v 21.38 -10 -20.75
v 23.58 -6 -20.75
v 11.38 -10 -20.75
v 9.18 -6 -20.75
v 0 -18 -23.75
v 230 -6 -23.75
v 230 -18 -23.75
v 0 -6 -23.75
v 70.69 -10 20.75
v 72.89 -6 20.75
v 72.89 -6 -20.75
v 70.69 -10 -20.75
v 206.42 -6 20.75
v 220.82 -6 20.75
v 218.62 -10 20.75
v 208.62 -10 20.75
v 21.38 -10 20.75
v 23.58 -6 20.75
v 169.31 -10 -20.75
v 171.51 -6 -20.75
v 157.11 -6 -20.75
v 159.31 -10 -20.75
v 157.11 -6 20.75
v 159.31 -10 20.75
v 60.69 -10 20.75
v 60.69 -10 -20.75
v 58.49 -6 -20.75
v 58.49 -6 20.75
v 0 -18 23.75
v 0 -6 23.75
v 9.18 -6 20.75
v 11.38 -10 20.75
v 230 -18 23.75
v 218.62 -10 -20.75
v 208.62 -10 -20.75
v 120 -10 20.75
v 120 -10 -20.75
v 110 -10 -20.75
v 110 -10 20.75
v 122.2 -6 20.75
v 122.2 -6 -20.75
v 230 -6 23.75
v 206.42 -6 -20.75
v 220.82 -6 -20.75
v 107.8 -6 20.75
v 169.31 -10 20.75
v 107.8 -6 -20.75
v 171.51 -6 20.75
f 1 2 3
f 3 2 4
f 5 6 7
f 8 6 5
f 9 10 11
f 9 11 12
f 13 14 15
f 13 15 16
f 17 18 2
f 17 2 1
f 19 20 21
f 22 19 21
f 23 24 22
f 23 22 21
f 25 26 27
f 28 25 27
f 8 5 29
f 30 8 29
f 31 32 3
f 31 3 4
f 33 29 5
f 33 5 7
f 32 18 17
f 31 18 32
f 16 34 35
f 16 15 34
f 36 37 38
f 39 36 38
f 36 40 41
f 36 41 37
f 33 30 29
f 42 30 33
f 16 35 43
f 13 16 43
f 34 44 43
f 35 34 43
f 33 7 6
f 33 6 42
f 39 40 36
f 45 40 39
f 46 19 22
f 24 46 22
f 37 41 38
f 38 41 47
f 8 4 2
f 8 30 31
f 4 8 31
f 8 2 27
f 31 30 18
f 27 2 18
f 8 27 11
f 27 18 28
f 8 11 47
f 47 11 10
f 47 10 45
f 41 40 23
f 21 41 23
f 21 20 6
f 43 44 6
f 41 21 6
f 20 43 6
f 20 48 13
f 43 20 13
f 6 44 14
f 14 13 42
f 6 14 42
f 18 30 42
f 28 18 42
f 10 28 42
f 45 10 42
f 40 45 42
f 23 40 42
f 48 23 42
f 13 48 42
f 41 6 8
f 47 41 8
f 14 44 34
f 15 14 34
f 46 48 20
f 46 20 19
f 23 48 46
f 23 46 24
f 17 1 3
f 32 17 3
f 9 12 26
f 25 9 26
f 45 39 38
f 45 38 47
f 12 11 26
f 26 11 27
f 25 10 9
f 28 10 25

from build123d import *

# Parameters (mm, degrees)
EXTRUDE_1_DEPTH     = 19.2
SKETCH_9_W          = 230
SKETCH_9_H          = 17.5
SKETCH_9_R          = 2.1
EXTRUDE_2_DEPTH     = 3
SKETCH_13_W         = 230
SKETCH_13_H         = 16
SKETCH_13_R         = 2.1
EXTRUDE_3_DEPTH     = 1.55
SKETCH_14_W         = 230
SKETCH_14_H         = 47.5
SKETCH_14_R         = 2.1
EXTRUDE_4_DEPTH     = 3
SKETCH_15_W         = 208.313471068
SKETCH_15_H         = 9.29970853
EXTRUDE_5_DEPTH     = 47.5
SKETCH_16_W         = 230
SKETCH_16_H         = 33.21324475
EXTRUDE_6_DEPTH     = 3
SKETCH_18_W         = 230
SKETCH_18_H         = 20.5
EXTRUDE_7_DEPTH     = 44.5
SKETCH_19_W         = 230
SKETCH_19_H         = 8.5
CUT_EXTRUDE_1_DEPTH = 236.542459017
CUT_EXTRUDE_2_DEPTH = 20.75


with BuildPart() as part:
    # ｽｹｯﾁ5 → ﾎﾞｽ - 押し出し1 (new body)
    with BuildSketch(Plane.XY.offset(-1.55)):
        with BuildLine():
            Line((230, -2.976), (227.539284327, -2.976))
            ThreePointArc((227.539284327, -2.976), (226.75348461, -2.728238301), (226.251905437, -2.074567596))
            Line((226.251905437, -2.074567596), (225.496824583, 0))
            Line((225.496824583, 0), (219.003175417, 0))
            Line((219.003175417, 0), (218.248094563, -2.074567596))
            ThreePointArc((218.248094563, -2.074567596), (217.74651539, -2.728238301), (216.960715673, -2.976))
            Line((216.960715673, -2.976), (214.839284327, -2.976))
            ThreePointArc((214.839284327, -2.976), (214.05348461, -2.728238301), (213.551905437, -2.074567596))
            Line((213.551905437, -2.074567596), (212.796824583, 0))
            Line((212.796824583, 0), (206.303175417, 0))
            Line((206.303175417, 0), (205.548094563, -2.074567596))
            ThreePointArc((205.548094563, -2.074567596), (205.04651539, -2.728238301), (204.260715673, -2.976))
            Line((204.260715673, -2.976), (202.139284327, -2.976))
            ThreePointArc((202.139284327, -2.976), (201.35348461, -2.728238301), (200.851905437, -2.074567596))
            Line((200.851905437, -2.074567596), (200.096824583, 0))
            Line((200.096824583, 0), (193.603175417, 0))
            Line((193.603175417, 0), (192.848094563, -2.074567596))
            ThreePointArc((192.848094563, -2.074567596), (192.34651539, -2.728238301), (191.560715673, -2.976))
            Line((191.560715673, -2.976), (189.439284327, -2.976))
            ThreePointArc((189.439284327, -2.976), (188.65348461, -2.728238301), (188.151905437, -2.074567596))
            Line((188.151905437, -2.074567596), (187.396824583, 0))
            Line((187.396824583, 0), (180.903175417, 0))
            Line((180.903175417, 0), (180.148094563, -2.074567596))
            ThreePointArc((180.148094563, -2.074567596), (179.64651539, -2.728238301), (178.860715673, -2.976))
            Line((178.860715673, -2.976), (176.739284327, -2.976))
            ThreePointArc((176.739284327, -2.976), (175.95348461, -2.728238301), (175.451905437, -2.074567596))
            Line((175.451905437, -2.074567596), (174.696824583, 0))
            Line((174.696824583, 0), (168.203175417, 0))
            Line((168.203175417, 0), (167.448094563, -2.074567596))
            ThreePointArc((167.448094563, -2.074567596), (166.94651539, -2.728238301), (166.160715673, -2.976))
            Line((166.160715673, -2.976), (164.039284327, -2.976))
            ThreePointArc((164.039284327, -2.976), (163.25348461, -2.728238301), (162.751905437, -2.074567596))
            Line((162.751905437, -2.074567596), (161.996824583, 0))
            Line((161.996824583, 0), (155.503175417, 0))
            Line((155.503175417, 0), (154.748094563, -2.074567596))
            ThreePointArc((154.748094563, -2.074567596), (154.24651539, -2.728238301), (153.460715673, -2.976))
            Line((153.460715673, -2.976), (151.339284327, -2.976))
            ThreePointArc((151.339284327, -2.976), (150.55348461, -2.728238301), (150.051905437, -2.074567596))
            Line((150.051905437, -2.074567596), (149.296824583, 0))
            Line((149.296824583, 0), (142.803175417, 0))
            Line((142.803175417, 0), (142.048094563, -2.074567596))
            ThreePointArc((142.048094563, -2.074567596), (141.54651539, -2.728238301), (140.760715673, -2.976))
            Line((140.760715673, -2.976), (138.639284327, -2.976))
            ThreePointArc((138.639284327, -2.976), (137.85348461, -2.728238301), (137.351905437, -2.074567596))
            Line((137.351905437, -2.074567596), (136.596824583, 0))
            Line((136.596824583, 0), (130.103175417, 0))
            Line((130.103175417, 0), (129.348094563, -2.074567596))
            ThreePointArc((129.348094563, -2.074567596), (128.84651539, -2.728238301), (128.060715673, -2.976))
            Line((128.060715673, -2.976), (125.939284327, -2.976))
            ThreePointArc((125.939284327, -2.976), (125.15348461, -2.728238301), (124.651905437, -2.074567596))
            Line((124.651905437, -2.074567596), (123.896824583, 0))
            Line((123.896824583, 0), (117.403175417, 0))
            Line((117.403175417, 0), (116.648094563, -2.074567596))
            ThreePointArc((116.648094563, -2.074567596), (116.14651539, -2.728238301), (115.360715673, -2.976))
            Line((115.360715673, -2.976), (113.239284327, -2.976))
            ThreePointArc((113.239284327, -2.976), (112.45348461, -2.728238301), (111.951905437, -2.074567596))
            Line((111.951905437, -2.074567596), (111.196824583, 0))
            Line((111.196824583, 0), (104.703175417, 0))
            Line((104.703175417, 0), (103.948094563, -2.074567596))
            ThreePointArc((103.948094563, -2.074567596), (103.44651539, -2.728238301), (102.660715673, -2.976))
            Line((102.660715673, -2.976), (100.539284327, -2.976))
            ThreePointArc((100.539284327, -2.976), (99.75348461, -2.728238301), (99.251905437, -2.074567596))
            Line((99.251905437, -2.074567596), (98.496824583, 0))
            Line((98.496824583, 0), (92.003175417, 0))
            Line((92.003175417, 0), (91.248094563, -2.074567596))
            ThreePointArc((91.248094563, -2.074567596), (90.74651539, -2.728238301), (89.960715673, -2.976))
            Line((89.960715673, -2.976), (87.839284327, -2.976))
            ThreePointArc((87.839284327, -2.976), (87.05348461, -2.728238301), (86.551905437, -2.074567596))
            Line((86.551905437, -2.074567596), (85.796824583, 0))
            Line((85.796824583, 0), (79.303175417, 0))
            Line((79.303175417, 0), (78.548094563, -2.074567596))
            ThreePointArc((78.548094563, -2.074567596), (78.04651539, -2.728238301), (77.260715673, -2.976))
            Line((77.260715673, -2.976), (75.139284327, -2.976))
            ThreePointArc((75.139284327, -2.976), (74.35348461, -2.728238301), (73.851905437, -2.074567596))
            Line((73.851905437, -2.074567596), (73.096824583, 0))
            Line((73.096824583, 0), (66.603175417, 0))
            Line((66.603175417, 0), (65.848094563, -2.074567596))
            ThreePointArc((65.848094563, -2.074567596), (65.34651539, -2.728238301), (64.560715673, -2.976))
            Line((64.560715673, -2.976), (62.439284327, -2.976))
            ThreePointArc((62.439284327, -2.976), (61.65348461, -2.728238301), (61.151905437, -2.074567596))
            Line((61.151905437, -2.074567596), (60.396824583, 0))
            Line((60.396824583, 0), (53.903175417, 0))
            Line((53.903175417, 0), (53.148094563, -2.074567596))
            ThreePointArc((53.148094563, -2.074567596), (52.64651539, -2.728238301), (51.860715673, -2.976))
            Line((51.860715673, -2.976), (49.739284327, -2.976))
            ThreePointArc((49.739284327, -2.976), (48.95348461, -2.728238301), (48.451905437, -2.074567596))
            Line((48.451905437, -2.074567596), (47.696824583, 0))
            Line((47.696824583, 0), (41.203175417, 0))
            Line((41.203175417, 0), (40.448094563, -2.074567596))
            ThreePointArc((40.448094563, -2.074567596), (39.94651539, -2.728238301), (39.160715673, -2.976))
            Line((39.160715673, -2.976), (37.039284327, -2.976))
            ThreePointArc((37.039284327, -2.976), (36.25348461, -2.728238301), (35.751905437, -2.074567596))
            Line((35.751905437, -2.074567596), (34.996824583, 0))
            Line((34.996824583, 0), (28.503175417, 0))
            Line((28.503175417, 0), (27.748094563, -2.074567596))
            ThreePointArc((27.748094563, -2.074567596), (27.24651539, -2.728238301), (26.460715673, -2.976))
            Line((26.460715673, -2.976), (24.339284327, -2.976))
            ThreePointArc((24.339284327, -2.976), (23.55348461, -2.728238301), (23.051905437, -2.074567596))
            Line((23.051905437, -2.074567596), (22.296824583, 0))
            Line((22.296824583, 0), (15.803175417, 0))
            Line((15.803175417, 0), (15.048094563, -2.074567596))
            ThreePointArc((15.048094563, -2.074567596), (14.54651539, -2.728238301), (13.760715673, -2.976))
            Line((13.760715673, -2.976), (11.639284327, -2.976))
            ThreePointArc((11.639284327, -2.976), (10.85348461, -2.728238301), (10.351905437, -2.074567596))
            Line((10.351905437, -2.074567596), (9.596824583, 0))
            Line((9.596824583, 0), (3.103175417, 0))
            Line((3.103175417, 0), (2.348094563, -2.074567596))
            ThreePointArc((2.348094563, -2.074567596), (1.84651539, -2.728238301), (1.060715673, -2.976))
            Line((1.060715673, -2.976), (0, -2.976))
            Line((0, -2.976), (0, -15))
            Line((0, -15), (230, -15))
            Line((230, -15), (230, -2.976))
        make_face()
    extrude(amount=-EXTRUDE_1_DEPTH)


with BuildPart() as body_2:
    # ｽｹｯﾁ9 → ﾎﾞｽ - 押し出し2 (new body)
    with BuildSketch(Plane(origin=(0, 0, -20.75), x_dir=(-1, 0, 0), z_dir=(0, 0, -1))):
        with Locations((-115, -6.25)):
            Rectangle(SKETCH_9_W, SKETCH_9_H)
        with Locations((-25, -7)):
            Circle(SKETCH_9_R, mode=Mode.SUBTRACT)
        with Locations((-85, -7)):
            Circle(SKETCH_9_R, mode=Mode.SUBTRACT)
        with Locations(Location((-145, -7, 0), (0, 0, 180))):
            Circle(SKETCH_9_R, mode=Mode.SUBTRACT)
        with Locations(Location((-205, -7, 0), (0, 0, 180))):
            Circle(SKETCH_9_R, mode=Mode.SUBTRACT)
    extrude(amount=EXTRUDE_2_DEPTH)


with BuildPart() as body_3:
    # ｽｹｯﾁ13 → ﾎﾞｽ - 押し出し3 (new, symmetric)
    with BuildSketch(Plane.XY):
        with Locations((115, -7)):
            Rectangle(SKETCH_13_W, SKETCH_13_H)
        with Locations(Location((85, -7, 0), (0, 0, 180))):
            Circle(SKETCH_13_R, mode=Mode.SUBTRACT)
        with Locations(Location((25, -7, 0), (0, 0, 180))):
            Circle(SKETCH_13_R, mode=Mode.SUBTRACT)
        with Locations((205, -7)):
            Circle(SKETCH_13_R, mode=Mode.SUBTRACT)
        with Locations((145, -7)):
            Circle(SKETCH_13_R, mode=Mode.SUBTRACT)
    extrude(amount=EXTRUDE_3_DEPTH, both=True)


with BuildPart() as body_4:
    # ﾐﾗｰ1: mirrored copy
    add(part.part.mirror(Plane.XY))


with BuildPart() as body_5:
    # Mirror 1 2: mirrored copy
    add(body_2.part.mirror(Plane.XY))


with BuildPart() as body_6:
    # ｽｹｯﾁ14 → ﾎﾞｽ - 押し出し4 (new body)
    with BuildSketch(Plane.XZ.offset(15)):
        with Locations((115, 0)):
            Rectangle(SKETCH_14_W, SKETCH_14_H)
        with Locations(Location((7, 11.15, 0), (0, 0, 180))):
            Circle(SKETCH_14_R, mode=Mode.SUBTRACT)
        with Locations((121.5, -11.15)):
            Circle(SKETCH_14_R, mode=Mode.SUBTRACT)
        with Locations((223, -11.15)):
            Circle(SKETCH_14_R, mode=Mode.SUBTRACT)
        with Locations((7, -11.15)):
            Circle(SKETCH_14_R, mode=Mode.SUBTRACT)
        with Locations(Location((223, 11.15, 0), (0, 0, 180))):
            Circle(SKETCH_14_R, mode=Mode.SUBTRACT)
        with Locations(Location((121.5, 11.15, 0), (0, 0, 180))):
            Circle(SKETCH_14_R, mode=Mode.SUBTRACT)
    extrude(amount=EXTRUDE_4_DEPTH)


with BuildPart() as body_4_1:
    add(body_4.part)

    # Combine 2: union part, body 5, body 6, body 3, body 2
    add(part.part)
    add(body_5.part)
    add(body_6.part)
    add(body_3.part)
    add(body_2.part)

    # ｽｹｯﾁ15 → ﾎﾞｽ - 押し出し5 (add)
    with BuildSketch(Plane(origin=(0, 0, -23.75), x_dir=(-1, 0, 0), z_dir=(0, 0, -1))):
        with Locations((-110.084439777, -7.625854265)):
            Rectangle(SKETCH_15_W, SKETCH_15_H)
    extrude(amount=-EXTRUDE_5_DEPTH)

    # ｽｹｯﾁ16 → ﾎﾞｽ - 押し出し6 (add)
    with BuildSketch(Plane.XZ.offset(18)):
        with Locations((115, 1.195676811)):
            Rectangle(SKETCH_16_W, SKETCH_16_H)
    extrude(amount=-EXTRUDE_6_DEPTH)

    # ｽｹｯﾁ18 → ﾎﾞｽ - 押し出し7 (add)
    with BuildSketch(Plane.XY.offset(23.75)):
        with Locations((115, -7.75)):
            Rectangle(SKETCH_18_W, SKETCH_18_H)
    extrude(amount=-EXTRUDE_7_DEPTH)

    # ｽｹｯﾁ19 → ｶｯﾄ - 押し出し1 (cut, through all)
    with BuildSketch(Plane.XY.offset(23.75)):
        with Locations((115, -1.75)):
            Rectangle(SKETCH_19_W, SKETCH_19_H)
    extrude(amount=-CUT_EXTRUDE_1_DEPTH, mode=Mode.SUBTRACT)

    # ｽｹｯﾁ17 → ｶｯﾄ - 押し出し2 (cut, symmetric)
    with BuildSketch(Plane.XY):
        Polygon((5.88, 0), (26.88, 0), (21.38, -10), (11.38, -10), align=None)
        Polygon((55.19, 0), (76.19, 0), (70.69, -10), (60.69, -10), align=None)
        Polygon((104.5, 0), (125.5, 0), (120, -10), (110, -10), align=None)
        Polygon((153.81, 0), (174.81, 0), (169.31, -10), (159.31, -10), align=None)
        Polygon((203.12, 0), (224.12, 0), (218.62, -10), (208.62, -10), align=None)
    extrude(amount=CUT_EXTRUDE_2_DEPTH, both=True, mode=Mode.SUBTRACT)


solid = body_4_1.part
